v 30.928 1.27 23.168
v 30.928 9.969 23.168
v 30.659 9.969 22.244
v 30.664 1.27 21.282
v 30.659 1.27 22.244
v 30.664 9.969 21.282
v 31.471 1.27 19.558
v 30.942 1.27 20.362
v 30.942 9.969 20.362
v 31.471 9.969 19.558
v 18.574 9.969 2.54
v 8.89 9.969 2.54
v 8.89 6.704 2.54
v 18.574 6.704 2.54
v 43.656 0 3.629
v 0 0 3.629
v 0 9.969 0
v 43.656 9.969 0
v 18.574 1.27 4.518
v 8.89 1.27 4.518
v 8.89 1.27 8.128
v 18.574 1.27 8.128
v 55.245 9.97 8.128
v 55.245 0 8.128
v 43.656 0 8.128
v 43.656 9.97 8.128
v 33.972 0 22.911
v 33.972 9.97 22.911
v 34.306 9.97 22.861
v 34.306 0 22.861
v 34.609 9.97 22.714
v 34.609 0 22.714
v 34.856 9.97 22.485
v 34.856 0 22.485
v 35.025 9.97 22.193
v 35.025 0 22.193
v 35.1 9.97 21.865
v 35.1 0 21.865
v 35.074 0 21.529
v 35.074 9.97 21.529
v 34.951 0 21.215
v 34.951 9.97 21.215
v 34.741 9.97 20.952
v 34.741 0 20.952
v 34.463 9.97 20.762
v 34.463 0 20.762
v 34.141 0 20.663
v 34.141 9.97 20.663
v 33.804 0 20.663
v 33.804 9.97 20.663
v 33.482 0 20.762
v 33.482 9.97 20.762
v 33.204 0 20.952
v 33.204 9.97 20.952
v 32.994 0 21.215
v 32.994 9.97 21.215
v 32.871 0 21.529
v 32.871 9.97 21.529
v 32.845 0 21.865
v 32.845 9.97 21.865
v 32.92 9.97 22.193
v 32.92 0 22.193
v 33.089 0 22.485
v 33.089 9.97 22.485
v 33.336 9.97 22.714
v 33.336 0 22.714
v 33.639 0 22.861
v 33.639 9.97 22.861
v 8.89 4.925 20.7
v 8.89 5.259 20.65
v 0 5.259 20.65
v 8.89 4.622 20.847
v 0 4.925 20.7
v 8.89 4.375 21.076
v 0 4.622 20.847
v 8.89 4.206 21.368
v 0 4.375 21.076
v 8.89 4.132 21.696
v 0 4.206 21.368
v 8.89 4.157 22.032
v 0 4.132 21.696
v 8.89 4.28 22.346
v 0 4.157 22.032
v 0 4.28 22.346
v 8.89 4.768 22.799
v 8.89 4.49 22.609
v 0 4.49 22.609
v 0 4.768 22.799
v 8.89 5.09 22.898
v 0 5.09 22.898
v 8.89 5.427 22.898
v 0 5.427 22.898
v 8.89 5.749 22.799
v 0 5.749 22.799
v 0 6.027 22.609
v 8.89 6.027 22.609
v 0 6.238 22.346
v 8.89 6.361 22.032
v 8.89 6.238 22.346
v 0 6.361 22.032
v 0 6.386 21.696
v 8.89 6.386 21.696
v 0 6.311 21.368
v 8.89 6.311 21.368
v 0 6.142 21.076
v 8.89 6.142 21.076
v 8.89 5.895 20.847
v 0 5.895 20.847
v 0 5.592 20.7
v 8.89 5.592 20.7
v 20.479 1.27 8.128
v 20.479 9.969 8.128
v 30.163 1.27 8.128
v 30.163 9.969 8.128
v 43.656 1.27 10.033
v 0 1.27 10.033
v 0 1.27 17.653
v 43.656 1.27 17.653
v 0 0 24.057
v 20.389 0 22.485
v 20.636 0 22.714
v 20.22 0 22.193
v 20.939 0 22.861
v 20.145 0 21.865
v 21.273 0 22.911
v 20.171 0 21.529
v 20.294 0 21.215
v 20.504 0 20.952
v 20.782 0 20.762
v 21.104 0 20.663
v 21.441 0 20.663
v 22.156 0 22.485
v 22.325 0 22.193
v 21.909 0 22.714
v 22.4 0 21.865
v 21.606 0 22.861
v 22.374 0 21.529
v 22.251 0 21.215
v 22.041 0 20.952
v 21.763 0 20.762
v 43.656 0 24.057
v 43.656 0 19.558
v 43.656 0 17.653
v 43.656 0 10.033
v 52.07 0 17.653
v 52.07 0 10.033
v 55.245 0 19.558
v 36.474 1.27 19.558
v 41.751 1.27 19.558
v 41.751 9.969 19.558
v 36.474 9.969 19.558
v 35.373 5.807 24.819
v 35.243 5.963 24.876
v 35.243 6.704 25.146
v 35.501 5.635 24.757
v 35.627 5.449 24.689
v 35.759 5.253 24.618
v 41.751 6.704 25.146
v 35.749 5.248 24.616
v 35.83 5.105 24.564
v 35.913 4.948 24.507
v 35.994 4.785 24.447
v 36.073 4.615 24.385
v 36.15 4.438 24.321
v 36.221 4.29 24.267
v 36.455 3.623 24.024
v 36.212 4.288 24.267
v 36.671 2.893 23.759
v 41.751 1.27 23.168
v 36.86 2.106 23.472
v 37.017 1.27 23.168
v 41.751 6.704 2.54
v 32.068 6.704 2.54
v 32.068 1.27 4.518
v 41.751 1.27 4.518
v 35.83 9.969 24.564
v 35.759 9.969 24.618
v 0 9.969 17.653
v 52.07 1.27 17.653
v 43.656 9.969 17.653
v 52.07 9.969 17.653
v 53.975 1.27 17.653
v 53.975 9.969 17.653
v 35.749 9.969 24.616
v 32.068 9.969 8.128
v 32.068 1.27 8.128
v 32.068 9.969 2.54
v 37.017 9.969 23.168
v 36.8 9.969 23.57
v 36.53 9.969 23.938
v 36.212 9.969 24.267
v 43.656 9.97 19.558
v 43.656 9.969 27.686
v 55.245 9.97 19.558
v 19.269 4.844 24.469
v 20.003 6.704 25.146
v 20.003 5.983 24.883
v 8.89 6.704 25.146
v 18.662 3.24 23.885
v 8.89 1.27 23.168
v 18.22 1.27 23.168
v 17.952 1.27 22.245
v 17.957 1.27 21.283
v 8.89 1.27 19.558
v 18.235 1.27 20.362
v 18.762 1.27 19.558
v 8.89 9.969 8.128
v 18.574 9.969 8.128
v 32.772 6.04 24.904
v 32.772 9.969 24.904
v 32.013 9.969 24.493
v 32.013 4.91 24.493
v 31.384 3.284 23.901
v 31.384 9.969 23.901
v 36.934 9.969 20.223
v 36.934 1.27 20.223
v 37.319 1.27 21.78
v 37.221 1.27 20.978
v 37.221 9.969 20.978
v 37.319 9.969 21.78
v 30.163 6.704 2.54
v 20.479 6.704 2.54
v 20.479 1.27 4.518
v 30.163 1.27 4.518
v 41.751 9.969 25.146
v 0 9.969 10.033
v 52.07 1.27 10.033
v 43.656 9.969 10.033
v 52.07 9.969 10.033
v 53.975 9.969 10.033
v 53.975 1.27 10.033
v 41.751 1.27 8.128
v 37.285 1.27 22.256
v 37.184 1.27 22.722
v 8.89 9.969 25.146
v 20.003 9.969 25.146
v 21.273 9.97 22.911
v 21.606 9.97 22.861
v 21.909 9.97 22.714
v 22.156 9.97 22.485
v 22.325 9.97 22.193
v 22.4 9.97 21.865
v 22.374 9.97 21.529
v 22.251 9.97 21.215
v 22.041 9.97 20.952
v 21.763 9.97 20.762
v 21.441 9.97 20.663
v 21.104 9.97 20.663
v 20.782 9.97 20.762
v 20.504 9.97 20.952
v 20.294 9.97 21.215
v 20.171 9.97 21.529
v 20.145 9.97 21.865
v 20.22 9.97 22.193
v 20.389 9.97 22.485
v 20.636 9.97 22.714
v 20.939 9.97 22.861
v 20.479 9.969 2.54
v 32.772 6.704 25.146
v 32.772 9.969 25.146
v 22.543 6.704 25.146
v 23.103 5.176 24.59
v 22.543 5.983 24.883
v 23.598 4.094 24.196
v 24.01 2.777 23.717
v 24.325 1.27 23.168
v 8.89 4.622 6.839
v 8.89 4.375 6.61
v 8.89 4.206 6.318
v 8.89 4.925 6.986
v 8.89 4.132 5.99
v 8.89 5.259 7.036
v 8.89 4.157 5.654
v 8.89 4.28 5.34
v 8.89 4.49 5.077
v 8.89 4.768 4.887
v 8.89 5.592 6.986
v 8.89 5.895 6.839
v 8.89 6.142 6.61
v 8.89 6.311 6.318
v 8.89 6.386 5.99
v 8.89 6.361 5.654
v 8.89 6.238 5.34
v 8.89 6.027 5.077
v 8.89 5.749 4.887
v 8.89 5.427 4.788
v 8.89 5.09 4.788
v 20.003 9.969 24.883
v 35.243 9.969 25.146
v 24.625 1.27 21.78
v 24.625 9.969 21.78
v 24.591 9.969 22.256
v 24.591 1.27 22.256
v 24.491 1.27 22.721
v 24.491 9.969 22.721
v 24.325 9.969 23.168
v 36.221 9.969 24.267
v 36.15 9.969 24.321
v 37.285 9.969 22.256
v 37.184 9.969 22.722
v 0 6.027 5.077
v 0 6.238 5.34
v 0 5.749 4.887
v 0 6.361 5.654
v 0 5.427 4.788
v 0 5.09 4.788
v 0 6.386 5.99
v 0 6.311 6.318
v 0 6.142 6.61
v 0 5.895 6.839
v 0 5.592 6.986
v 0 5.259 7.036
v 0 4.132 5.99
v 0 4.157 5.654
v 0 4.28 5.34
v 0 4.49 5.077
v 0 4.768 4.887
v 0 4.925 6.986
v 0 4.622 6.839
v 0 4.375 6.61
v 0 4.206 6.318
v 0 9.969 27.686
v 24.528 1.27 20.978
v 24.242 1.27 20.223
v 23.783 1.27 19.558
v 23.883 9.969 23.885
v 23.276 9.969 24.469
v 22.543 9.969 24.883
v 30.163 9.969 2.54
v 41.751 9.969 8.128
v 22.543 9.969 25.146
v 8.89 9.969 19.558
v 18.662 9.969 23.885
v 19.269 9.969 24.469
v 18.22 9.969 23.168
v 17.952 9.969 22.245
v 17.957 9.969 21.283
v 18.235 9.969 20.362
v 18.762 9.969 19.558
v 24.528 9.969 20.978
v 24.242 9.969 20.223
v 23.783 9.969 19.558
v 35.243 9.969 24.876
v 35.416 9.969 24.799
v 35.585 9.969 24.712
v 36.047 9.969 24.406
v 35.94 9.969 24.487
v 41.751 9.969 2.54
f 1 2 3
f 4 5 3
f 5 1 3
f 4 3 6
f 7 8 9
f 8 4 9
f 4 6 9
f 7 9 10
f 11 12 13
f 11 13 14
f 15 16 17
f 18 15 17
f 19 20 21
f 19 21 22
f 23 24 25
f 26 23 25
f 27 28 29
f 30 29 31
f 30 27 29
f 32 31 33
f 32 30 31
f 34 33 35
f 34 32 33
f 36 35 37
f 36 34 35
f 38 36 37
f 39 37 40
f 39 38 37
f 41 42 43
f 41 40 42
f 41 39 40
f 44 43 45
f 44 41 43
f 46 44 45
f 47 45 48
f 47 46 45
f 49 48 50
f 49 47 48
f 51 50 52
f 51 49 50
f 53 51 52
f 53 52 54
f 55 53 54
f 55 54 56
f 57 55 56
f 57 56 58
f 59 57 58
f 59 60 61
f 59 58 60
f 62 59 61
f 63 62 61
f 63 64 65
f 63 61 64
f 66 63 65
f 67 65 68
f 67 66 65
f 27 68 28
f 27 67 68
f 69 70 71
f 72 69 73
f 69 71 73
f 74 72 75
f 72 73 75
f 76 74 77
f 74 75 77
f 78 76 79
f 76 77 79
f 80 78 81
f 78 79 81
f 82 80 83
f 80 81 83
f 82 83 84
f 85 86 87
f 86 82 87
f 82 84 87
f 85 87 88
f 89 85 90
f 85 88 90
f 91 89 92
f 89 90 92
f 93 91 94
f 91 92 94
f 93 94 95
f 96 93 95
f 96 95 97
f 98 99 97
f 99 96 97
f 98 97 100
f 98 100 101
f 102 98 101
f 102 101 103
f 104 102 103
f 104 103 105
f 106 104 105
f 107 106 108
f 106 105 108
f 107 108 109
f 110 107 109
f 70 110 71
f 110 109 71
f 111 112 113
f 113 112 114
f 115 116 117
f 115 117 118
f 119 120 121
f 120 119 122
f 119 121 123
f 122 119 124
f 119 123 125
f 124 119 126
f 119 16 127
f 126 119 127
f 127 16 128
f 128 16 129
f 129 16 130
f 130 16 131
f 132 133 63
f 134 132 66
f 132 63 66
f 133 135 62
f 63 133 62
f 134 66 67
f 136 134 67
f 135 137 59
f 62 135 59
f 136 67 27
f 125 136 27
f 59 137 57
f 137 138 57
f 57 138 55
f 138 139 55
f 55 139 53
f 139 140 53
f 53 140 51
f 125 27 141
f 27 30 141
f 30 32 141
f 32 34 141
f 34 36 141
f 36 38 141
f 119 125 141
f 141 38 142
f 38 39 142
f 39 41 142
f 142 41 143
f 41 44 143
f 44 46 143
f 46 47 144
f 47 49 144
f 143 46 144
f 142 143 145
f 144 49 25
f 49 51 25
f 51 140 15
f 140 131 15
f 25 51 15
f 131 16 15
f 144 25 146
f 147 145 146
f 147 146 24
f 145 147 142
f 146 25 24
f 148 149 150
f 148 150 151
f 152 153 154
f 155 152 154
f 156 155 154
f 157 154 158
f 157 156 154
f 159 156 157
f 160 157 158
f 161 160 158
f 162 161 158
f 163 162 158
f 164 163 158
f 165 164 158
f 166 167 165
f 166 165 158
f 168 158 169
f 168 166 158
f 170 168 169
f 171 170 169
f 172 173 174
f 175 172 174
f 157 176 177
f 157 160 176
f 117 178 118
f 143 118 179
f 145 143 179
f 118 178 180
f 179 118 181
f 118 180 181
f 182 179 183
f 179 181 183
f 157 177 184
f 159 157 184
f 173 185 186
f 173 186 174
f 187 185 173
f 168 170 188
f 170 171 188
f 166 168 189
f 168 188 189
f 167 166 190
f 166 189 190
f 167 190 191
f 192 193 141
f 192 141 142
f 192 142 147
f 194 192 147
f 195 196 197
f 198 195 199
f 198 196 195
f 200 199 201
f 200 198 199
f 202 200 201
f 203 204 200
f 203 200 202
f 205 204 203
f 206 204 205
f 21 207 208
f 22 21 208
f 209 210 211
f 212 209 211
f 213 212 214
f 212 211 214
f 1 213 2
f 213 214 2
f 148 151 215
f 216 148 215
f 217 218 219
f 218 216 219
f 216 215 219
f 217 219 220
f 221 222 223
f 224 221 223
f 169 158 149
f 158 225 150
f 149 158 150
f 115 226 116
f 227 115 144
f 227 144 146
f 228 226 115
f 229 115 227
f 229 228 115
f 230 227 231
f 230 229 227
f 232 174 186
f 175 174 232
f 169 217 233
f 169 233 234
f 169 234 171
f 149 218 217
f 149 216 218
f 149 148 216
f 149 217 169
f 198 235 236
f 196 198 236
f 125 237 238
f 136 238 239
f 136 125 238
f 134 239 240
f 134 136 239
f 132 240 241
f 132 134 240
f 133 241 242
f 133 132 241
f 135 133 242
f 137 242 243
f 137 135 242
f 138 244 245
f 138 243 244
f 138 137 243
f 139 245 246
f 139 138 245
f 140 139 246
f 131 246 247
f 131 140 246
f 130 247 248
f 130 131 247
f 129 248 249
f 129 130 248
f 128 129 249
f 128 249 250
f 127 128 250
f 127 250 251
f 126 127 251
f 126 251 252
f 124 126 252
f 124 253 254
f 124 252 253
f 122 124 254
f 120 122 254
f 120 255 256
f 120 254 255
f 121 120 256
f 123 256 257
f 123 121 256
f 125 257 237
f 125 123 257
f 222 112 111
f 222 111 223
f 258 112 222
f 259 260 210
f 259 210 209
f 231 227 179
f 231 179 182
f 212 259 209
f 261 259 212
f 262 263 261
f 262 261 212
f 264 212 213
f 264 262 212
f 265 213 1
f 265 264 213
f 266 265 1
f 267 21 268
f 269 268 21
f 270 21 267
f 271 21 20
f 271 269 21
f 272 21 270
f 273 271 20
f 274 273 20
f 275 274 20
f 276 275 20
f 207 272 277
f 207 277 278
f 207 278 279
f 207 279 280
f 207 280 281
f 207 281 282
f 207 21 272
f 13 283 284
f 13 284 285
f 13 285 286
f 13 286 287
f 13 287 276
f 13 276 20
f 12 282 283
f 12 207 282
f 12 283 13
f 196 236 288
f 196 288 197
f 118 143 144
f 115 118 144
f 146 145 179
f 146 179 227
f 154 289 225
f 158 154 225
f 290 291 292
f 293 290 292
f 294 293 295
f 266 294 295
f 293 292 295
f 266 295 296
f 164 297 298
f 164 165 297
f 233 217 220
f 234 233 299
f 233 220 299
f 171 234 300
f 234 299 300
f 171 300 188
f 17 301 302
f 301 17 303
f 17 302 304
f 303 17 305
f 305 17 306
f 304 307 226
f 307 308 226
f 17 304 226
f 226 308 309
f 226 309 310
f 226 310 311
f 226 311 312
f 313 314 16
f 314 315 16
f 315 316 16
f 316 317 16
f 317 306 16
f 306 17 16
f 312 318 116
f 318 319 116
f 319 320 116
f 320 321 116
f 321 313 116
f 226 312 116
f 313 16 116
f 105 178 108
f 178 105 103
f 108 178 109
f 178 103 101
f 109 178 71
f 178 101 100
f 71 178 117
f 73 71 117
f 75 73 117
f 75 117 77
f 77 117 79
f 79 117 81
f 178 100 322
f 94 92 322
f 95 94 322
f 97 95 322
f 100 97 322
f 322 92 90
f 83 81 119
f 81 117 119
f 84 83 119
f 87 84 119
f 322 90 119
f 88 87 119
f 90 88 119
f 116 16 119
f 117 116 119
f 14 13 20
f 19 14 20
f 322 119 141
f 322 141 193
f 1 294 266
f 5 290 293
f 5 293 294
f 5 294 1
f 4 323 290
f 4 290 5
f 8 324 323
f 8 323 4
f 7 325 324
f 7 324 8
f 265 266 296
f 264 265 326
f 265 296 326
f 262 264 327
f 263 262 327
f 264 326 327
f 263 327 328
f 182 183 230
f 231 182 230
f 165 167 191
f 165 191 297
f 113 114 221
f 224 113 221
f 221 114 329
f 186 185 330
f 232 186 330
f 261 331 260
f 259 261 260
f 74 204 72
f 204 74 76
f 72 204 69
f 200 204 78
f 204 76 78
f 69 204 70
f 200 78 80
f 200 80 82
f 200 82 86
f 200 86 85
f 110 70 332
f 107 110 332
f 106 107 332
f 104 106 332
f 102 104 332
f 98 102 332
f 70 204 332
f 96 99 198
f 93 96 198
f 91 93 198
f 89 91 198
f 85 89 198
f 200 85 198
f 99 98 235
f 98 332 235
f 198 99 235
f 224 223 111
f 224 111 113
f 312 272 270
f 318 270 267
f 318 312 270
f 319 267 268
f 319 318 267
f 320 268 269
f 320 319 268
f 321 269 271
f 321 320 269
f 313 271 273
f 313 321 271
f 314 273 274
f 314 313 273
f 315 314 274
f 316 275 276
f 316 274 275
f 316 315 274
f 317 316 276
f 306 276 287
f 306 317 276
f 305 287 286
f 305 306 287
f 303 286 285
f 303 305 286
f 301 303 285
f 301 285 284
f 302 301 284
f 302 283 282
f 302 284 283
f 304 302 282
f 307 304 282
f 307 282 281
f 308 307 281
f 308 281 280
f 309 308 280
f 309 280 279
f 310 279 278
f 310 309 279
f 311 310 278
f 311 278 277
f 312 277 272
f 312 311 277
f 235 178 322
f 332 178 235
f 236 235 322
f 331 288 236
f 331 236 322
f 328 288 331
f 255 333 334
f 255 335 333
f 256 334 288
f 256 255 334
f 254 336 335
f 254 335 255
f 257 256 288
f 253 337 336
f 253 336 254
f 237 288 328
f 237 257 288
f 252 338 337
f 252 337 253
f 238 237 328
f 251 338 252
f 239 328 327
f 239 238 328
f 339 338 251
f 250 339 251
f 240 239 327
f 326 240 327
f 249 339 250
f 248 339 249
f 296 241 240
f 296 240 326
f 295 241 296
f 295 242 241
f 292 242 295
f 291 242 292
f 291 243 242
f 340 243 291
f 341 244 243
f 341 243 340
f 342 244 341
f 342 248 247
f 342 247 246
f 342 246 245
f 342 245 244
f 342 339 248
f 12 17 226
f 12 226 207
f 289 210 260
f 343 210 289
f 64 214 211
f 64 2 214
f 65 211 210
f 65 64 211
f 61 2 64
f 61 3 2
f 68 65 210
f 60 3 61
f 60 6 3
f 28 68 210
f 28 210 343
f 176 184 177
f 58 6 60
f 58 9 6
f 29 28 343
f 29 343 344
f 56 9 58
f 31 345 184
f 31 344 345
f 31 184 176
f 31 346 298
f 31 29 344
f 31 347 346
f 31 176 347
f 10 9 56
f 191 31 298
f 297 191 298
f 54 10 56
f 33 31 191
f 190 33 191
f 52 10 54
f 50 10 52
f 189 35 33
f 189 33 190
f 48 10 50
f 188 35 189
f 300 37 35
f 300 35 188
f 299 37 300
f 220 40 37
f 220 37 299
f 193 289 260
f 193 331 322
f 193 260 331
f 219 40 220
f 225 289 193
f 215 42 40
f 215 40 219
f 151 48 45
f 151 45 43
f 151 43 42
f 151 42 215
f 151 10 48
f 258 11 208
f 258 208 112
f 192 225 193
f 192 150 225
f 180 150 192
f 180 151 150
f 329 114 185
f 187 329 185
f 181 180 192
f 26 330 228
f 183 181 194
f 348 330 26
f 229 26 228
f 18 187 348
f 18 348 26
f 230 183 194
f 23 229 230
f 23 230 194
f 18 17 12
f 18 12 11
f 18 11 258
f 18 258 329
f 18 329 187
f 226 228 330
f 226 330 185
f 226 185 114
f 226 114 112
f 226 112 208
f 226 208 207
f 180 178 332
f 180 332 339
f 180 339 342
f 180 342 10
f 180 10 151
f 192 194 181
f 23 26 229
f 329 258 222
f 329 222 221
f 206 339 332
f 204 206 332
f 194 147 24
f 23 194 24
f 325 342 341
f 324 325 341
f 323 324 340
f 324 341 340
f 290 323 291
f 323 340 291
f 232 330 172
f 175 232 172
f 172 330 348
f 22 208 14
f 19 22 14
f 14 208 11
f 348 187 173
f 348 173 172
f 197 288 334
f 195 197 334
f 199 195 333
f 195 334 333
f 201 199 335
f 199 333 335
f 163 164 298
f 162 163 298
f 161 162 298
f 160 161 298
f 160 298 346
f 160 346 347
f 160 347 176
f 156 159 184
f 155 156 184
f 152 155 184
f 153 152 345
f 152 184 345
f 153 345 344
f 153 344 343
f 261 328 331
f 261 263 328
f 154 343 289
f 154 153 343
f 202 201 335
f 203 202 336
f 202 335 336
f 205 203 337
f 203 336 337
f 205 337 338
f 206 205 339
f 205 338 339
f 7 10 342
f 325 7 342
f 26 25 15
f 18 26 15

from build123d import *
from OCP.BRepAlgoAPI import BRepAlgoAPI_Cut
from OCP.TopTools import TopTools_ListOfShape

# Parameters (mm, degrees)
SKETCH_283_W           = 8.41374588
SKETCH_283_H           = 7.619999886
EXTRUDE_5712_DEPTH     = 9.9695
SKETCH_4_W             = 9.683748245
SKETCH_4_H             = 5.588000536
SKETCH_4_W_2           = 9.683750153
SKETCH_4_W_3           = 1.905002594
SKETCH_4_H_2           = 7.619999886
SKETCH_4_W_4           = 43.656253815
CUT_EXTRUDE_5770_DEPTH = 8.6995
CUT_EXTRUDE_9_DEPTH    = 63.593257627
EXTRUDE_10_REACH       = 64.593
CUT_EXTRUDE_11_REACH   = 64.593
SKETCH_7_R             = 1.130300066
SKETCH_5_R             = 1.13029956
SKETCH_5_R_2           = 1.130299504
CUT_EXTRUDE_12_DEPTH   = 63.593257627


with BuildPart() as part:
    # Sketch 283 → Extrude 5712 (new body)
    with BuildSketch(Plane(origin=(0, 0, 0), x_dir=(1, 0, 0), z_dir=(0, 1, 0))):
        Polygon((43.656253815, 0), (0, 0), (0, -27.686000824), (43.656253815, -27.686000824), (43.656253815, -19.557998657), (55.245002747, -19.557998657), (55.245002747, -8.128000259), (43.656253815, -8.128000259), align=None)
        with Locations((47.863126755, -13.842999935)):
            Rectangle(SKETCH_283_W, SKETCH_283_H, mode=Mode.SUBTRACT)
    extrude(amount=EXTRUDE_5712_DEPTH)


with BuildPart() as cut_extrude_5770_tool:
    # 草图4 → Cut-Extrude 5770 (new body)
    with BuildSketch(Plane(origin=(0, 9.969499588, 0), x_dir=(1, 0, 0), z_dir=(0, 1, 0))):
        with Locations((13.73187542, -5.333999991)):
            Rectangle(SKETCH_4_W, SKETCH_4_H)
        with Locations((25.320626258, -5.333999991)):
            Rectangle(SKETCH_4_W, SKETCH_4_H)
        with Locations((36.909376145, -5.333999991)):
            Rectangle(SKETCH_4_W_2, SKETCH_4_H)
        with Locations((53.022500992, -13.842999935)):
            Rectangle(SKETCH_4_W_3, SKETCH_4_H_2)
        with Locations((21.828126907, -13.842999935)):
            Rectangle(SKETCH_4_W_4, SKETCH_4_H_2)
        with BuildLine():
            ThreePointArc((18.220330198, -23.168134689), (17.956836473, -21.282857597), (18.762168884, -19.557998657))
            Line((18.762168884, -19.557998657), (8.890001297, -19.557998657))
            Line((8.890001297, -19.557998657), (8.890001297, -23.168134689))
            Line((8.890001297, -23.168134689), (18.220330198, -23.168134689))
        make_face()
        with BuildLine():
            ThreePointArc((20.002500534, -24.883461506), (18.947446601, -24.196156461), (18.220330198, -23.168134689))
            Line((18.220330198, -23.168134689), (8.890001297, -23.168134689))
            Line((8.890001297, -23.168134689), (8.890001297, -25.145999908))
            Line((8.890001297, -25.145999908), (20.002500534, -25.145999908))
            Line((20.002500534, -25.145999908), (20.002500534, -24.883461506))
        make_face()
        with BuildLine():
            ThreePointArc((30.927521198, -23.168134689), (30.663518149, -21.282433428), (31.470916179, -19.557998657))
            Line((31.470916179, -19.557998657), (23.782831176, -19.557998657))
            ThreePointArc((23.782831176, -19.557998657), (24.407616627, -20.592090361), (24.625300686, -21.78049945))
            ThreePointArc((24.625300686, -21.78049945), (24.549281168, -22.490413257), (24.324669862, -23.168134689))
            Line((24.324669862, -23.168134689), (30.927521198, -23.168134689))
        make_face()
        with BuildLine():
            ThreePointArc((32.772350311, -24.904129054), (31.679314783, -24.217449589), (30.927521198, -23.168134689))
            Line((30.927521198, -23.168134689), (24.324669862, -23.168134689))
            ThreePointArc((24.324669862, -23.168134689), (23.597554208, -24.19615574), (22.54250145, -24.883460719))
            Line((22.54250145, -24.883460719), (22.54250145, -25.145999908))
            Line((22.54250145, -25.145999908), (32.772350311, -25.145999908))
            Line((32.772350311, -25.145999908), (32.772350311, -24.904129054))
        make_face()
        with BuildLine():
            Line((41.751251221, -25.145999908), (41.751251221, -23.168134689))
            Line((41.751251221, -23.168134689), (37.017476717, -23.168134689))
            ThreePointArc((37.017476717, -23.168134689), (36.671360521, -23.758773077), (36.212287817, -24.266613976))
            Line((36.212287817, -24.266613976), (36.221363068, -24.267242432))
            Line((36.221363068, -24.267242432), (36.150205492, -24.321171358))
            ThreePointArc((36.150205492, -24.321171358), (35.993676848, -24.447381385), (35.8298504, -24.563962181))
            Line((35.8298504, -24.563962181), (35.758705139, -24.617881775))
            Line((35.758705139, -24.617881775), (35.749340746, -24.616033322))
            ThreePointArc((35.749340746, -24.616033322), (35.501472205, -24.757017499), (35.242500305, -24.876386285))
            Line((35.242500305, -24.876386285), (35.242500305, -25.145999908))
            Line((35.242500305, -25.145999908), (41.751251221, -25.145999908))
        make_face()
        with BuildLine():
            Line((41.751251221, -23.168134689), (41.751251221, -19.557998657))
            Line((41.751251221, -19.557998657), (36.474081737, -19.557998657))
            ThreePointArc((36.474081737, -19.557998657), (37.10046612, -20.591699149), (37.318754037, -21.780498749))
            ThreePointArc((37.318754037, -21.780498749), (37.242567409, -22.490481412), (37.017476717, -23.168134689))
            Line((37.017476717, -23.168134689), (41.751251221, -23.168134689))
        make_face()
    extrude(amount=-CUT_EXTRUDE_5770_DEPTH)


with BuildPart() as part_1:
    add(part.part)

    # Cut-Extrude 5770: cut by cut_extrude_5770_tool, with a tolerance
    cut_extrude_5770_stock = TopTools_ListOfShape()
    cut_extrude_5770_stock.Append(part_1.part.wrapped)
    cut_extrude_5770_tools = TopTools_ListOfShape()
    cut_extrude_5770_tools.Append(cut_extrude_5770_tool.part.wrapped)
    cut_extrude_5770_cut = BRepAlgoAPI_Cut()
    cut_extrude_5770_cut.SetArguments(cut_extrude_5770_stock)
    cut_extrude_5770_cut.SetTools(cut_extrude_5770_tools)
    cut_extrude_5770_cut.SetFuzzyValue(0.00001)
    cut_extrude_5770_cut.Build()
    add(Compound.cast(cut_extrude_5770_cut.Shape()).solids(), mode=Mode.REPLACE)

    # Sketch 3431 → 拉伸9 (cut, through all)
    with BuildSketch(Plane(origin=(0, 0, 0), x_dir=(0, 0, -1), z_dir=(1, 0, 0))):
        Polygon((0, 0), (-3.628601313, 0), (0, 9.969499588), align=None)
    cut_extrude_9 = extrude(amount=CUT_EXTRUDE_9_DEPTH, mode=Mode.SUBTRACT)

    # 拉伸10: up to this face of the body (flat: up to its plane)
    extrude_10_end = Plane(part_1.part.faces().sort_by_distance((43.656253815, 5.462221292, 4.884257746))[0])
    # 右视标记<6> → 拉伸10 (add, up to the picked face)
    with BuildSketch(Plane(origin=(0, 0, 0), x_dir=(0, 0, -1), z_dir=(1, 0, 0)), mode=Mode.PRIVATE) as extrude_10_sk1:
        Polygon((-8.128000259, 1.269999862), (-8.128000259, 0), (-3.628601313, 0), (0, 9.969499588), (-2.539999723, 9.969499588), (-2.539999723, 6.704138756), (-4.517864227, 1.269999862), align=None)
    extrude_10_tool1 = split(extrude(extrude_10_sk1.sketch, amount=EXTRUDE_10_REACH, mode=Mode.PRIVATE), bisect_by=extrude_10_end, keep=Keep.BOTH, mode=Mode.PRIVATE)
    extrude_10 = extrude_10_tool1.solids().sort_by(Axis((0, 4.424317, 3.31525), (1, 0, 0)))[0]
    add(extrude_10)

    # 右视标记<7> → 拉伸11 (cut, up to next)
    with BuildSketch(Plane(origin=(0, 0, 0), x_dir=(0, 0, -1), z_dir=(1, 0, 0)), mode=Mode.PRIVATE) as cut_extrude_11_sk1:
        with Locations(Location((-5.905499899, 5.258642622, 0), (0, 0, 180))):
            Circle(SKETCH_7_R)
    cut_extrude_11_tool1 = extrude(cut_extrude_11_sk1.sketch, amount=CUT_EXTRUDE_11_REACH, mode=Mode.PRIVATE) & part_1.part
    cut_extrude_11 = cut_extrude_11_tool1.solids().sort_by_distance((0, 5.258643, 5.9055))[0]
    add(cut_extrude_11, mode=Mode.SUBTRACT)

    # 镜向2: 拉伸9, 拉伸10, 拉伸11 across plane
    add(cut_extrude_9.mirror(Plane.XY.offset(13.843000412)), mode=Mode.SUBTRACT)
    add(extrude_10.mirror(Plane.XY.offset(13.843000412)))
    add(cut_extrude_11.mirror(Plane.XY.offset(13.843000412)), mode=Mode.SUBTRACT)

    # 上视标记<5> → 拉伸12 (cut, through all)
    with BuildSketch(Plane(origin=(0, 0, 0), x_dir=(1, 0, 0), z_dir=(0, 1, 0))):
        with Locations(Location((21.27250003, -21.78049945, 0), (0, 0, 270))):
            Circle(SKETCH_5_R)
        with Locations(Location((33.972498958, -21.780498749, 0), (0, 0, 270))):
            Circle(SKETCH_5_R_2)
    extrude(amount=CUT_EXTRUDE_12_DEPTH, mode=Mode.SUBTRACT)


solid = part_1.part
